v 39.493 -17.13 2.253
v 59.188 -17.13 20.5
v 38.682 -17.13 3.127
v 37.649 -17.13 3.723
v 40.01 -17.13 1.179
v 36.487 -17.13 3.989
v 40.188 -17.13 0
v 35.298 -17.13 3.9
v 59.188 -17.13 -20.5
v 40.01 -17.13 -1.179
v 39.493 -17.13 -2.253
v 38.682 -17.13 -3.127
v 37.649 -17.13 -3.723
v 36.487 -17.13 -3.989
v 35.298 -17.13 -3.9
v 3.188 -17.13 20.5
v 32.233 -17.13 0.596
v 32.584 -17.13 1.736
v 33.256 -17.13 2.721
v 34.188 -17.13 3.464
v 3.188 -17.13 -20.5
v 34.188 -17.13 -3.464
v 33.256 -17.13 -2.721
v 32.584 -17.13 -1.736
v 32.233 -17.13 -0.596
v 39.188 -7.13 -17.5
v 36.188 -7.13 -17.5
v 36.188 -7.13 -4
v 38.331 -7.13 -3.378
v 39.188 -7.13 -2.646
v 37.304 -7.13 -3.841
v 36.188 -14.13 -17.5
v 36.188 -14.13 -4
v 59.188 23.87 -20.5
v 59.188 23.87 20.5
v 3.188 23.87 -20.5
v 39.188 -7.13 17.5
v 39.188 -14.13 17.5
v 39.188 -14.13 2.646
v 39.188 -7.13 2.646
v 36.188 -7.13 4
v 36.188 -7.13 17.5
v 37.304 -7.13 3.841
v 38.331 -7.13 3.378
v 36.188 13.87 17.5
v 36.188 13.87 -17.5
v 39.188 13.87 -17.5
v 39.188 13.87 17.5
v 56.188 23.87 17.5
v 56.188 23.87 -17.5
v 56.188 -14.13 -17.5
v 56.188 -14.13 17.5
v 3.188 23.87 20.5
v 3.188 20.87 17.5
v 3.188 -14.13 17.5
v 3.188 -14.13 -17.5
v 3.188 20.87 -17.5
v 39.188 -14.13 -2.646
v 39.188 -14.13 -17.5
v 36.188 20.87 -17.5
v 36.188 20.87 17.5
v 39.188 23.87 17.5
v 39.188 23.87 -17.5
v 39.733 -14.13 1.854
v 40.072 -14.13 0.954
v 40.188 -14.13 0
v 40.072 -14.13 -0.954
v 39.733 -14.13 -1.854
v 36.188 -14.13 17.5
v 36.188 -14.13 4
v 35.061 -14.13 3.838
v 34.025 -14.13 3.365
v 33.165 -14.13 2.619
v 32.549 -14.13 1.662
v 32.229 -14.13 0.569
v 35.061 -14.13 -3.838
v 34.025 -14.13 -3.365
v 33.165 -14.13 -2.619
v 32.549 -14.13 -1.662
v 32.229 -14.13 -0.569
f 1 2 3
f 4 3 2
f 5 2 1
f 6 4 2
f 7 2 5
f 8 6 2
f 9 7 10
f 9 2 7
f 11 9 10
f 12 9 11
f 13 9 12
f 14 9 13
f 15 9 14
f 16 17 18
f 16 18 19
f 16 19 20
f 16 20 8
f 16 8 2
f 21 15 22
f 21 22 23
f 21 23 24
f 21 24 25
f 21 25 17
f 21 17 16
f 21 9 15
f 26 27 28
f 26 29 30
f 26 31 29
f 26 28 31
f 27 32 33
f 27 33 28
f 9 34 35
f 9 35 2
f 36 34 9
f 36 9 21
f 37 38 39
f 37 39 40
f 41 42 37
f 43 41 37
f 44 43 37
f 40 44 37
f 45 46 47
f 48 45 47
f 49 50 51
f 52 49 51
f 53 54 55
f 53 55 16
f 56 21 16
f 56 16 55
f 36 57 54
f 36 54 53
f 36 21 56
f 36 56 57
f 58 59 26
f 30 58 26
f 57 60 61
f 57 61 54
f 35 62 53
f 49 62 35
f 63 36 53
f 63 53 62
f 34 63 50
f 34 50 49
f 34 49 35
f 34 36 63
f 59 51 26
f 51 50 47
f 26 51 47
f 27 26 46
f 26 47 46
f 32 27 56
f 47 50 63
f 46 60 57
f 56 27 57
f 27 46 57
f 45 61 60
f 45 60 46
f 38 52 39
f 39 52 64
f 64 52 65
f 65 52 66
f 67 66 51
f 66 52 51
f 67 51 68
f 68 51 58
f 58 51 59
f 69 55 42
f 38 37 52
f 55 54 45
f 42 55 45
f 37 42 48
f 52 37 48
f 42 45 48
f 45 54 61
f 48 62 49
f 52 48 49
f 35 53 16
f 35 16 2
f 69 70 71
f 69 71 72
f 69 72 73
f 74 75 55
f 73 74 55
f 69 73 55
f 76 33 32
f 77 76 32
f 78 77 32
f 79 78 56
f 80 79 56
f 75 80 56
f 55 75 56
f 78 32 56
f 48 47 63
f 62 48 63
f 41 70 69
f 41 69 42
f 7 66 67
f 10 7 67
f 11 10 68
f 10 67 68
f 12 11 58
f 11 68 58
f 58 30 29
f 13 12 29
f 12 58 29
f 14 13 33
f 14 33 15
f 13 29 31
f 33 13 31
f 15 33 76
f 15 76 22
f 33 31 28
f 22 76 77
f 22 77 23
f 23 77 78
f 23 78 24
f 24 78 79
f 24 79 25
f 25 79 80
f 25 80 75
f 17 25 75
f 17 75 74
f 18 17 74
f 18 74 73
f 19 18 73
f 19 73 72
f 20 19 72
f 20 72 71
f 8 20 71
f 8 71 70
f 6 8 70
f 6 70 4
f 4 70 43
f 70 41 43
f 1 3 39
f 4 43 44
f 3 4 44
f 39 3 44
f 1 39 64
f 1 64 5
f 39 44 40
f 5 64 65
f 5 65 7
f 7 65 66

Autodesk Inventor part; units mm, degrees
ref_plane "YZ Plane" through (0, 0, 0) normal (1, 0, 0) x (0, 1, 0)
ref_plane "XZ Plane" through (0, 0, 0) normal (0, 1, 0) x (-1, 0, 0)
ref_plane "XY Plane" through (0, 0, 0) normal (0, 0, 1) x (1, 0, 0)
sketch "Sketch1" plane through (0, 0, 0) normal (0, 0, 1) x (1, 0, 0)
  line L0 (6.1879, 20.8703) -> (36.1879, 20.8703)
  line L1 (36.1879, -14.1297) -> (6.1879, -14.1297)
  line L2 (39.1879, 23.8703) -> (3.1879, 23.8703)
  line L3 (3.1879, -17.1297) -> (39.1879, -17.1297)
  line L4 (56.1879, 23.8703) -> (59.1879, 23.8703)
  line L5 (59.1879, 23.8703) -> (59.1879, -17.1297)
  line L6 (59.1879, -17.1297) -> (39.1879, -17.1297)
  line L7 (56.1879, 20.8703) -> (56.1879, -14.1297)
  line L8 (56.1879, -14.1297) -> (39.1879, -14.1297)
  line L9 (36.1879, 20.8703) -> (36.1879, 13.8703)
  line L10 (36.1879, 13.8703) -> (39.1879, 13.8703)
  line L11 (36.1879, -14.1297) -> (36.1879, -7.1297)
  line L12 (36.1879, -7.1297) -> (39.1879, -7.1297)
  line L13 (36.1879, 20.8703) -> (36.1879, 13.8703)
  line L14 (36.1879, -7.1297) -> (36.1879, -14.1297)
  line L15 (39.1879, -14.1297) -> (39.1879, -7.1297)
  line L16 (39.1879, 13.8703) -> (39.1879, 20.8703)
  line L17 (3.1879, 23.8703) -> (3.1879, 20.8703)
  line L18 (3.1879, -14.1297) -> (3.1879, -17.1297)
  line L19 (6.1879, 20.8703) -> (3.1879, 20.8703)
  line L20 (6.1879, -14.1297) -> (3.1879, -14.1297)
  line L21 (39.1879, 20.8703) -> (39.1879, 23.8703)
  line L22 (56.1879, 20.8703) -> (56.1879, 23.8703)
  point P0 (0, 0)
  dimension "d1" = 35
  dimension "d2" = 3
  dimension "d3" = 20
  dimension "d5" = 7
  dimension "d6" = 7
  dimension "d7" = 30
extrude "Extrusion1" add sketch "Sketch1" along normal mid plane 35
sketch "Sketch2" plane through (0, 0, -17.5) normal (0, 0, -1) x (-1, 0, 0)
  line L0 (-59.1879, 23.8703) -> (-3.1879, 23.8703) projected
  line L1 (-3.1879, -17.1297) -> (-59.1879, -17.1297) projected
  line L2 (-59.1879, 23.8703) -> (-3.1879, 23.8703)
  line L3 (-3.1879, 23.8703) -> (-3.1879, -17.1297)
  line L4 (-3.1879, -17.1297) -> (-59.1879, -17.1297)
  line L5 (-59.1879, -17.1297) -> (-59.1879, 23.8703)
  point P0 (0, 0)
extrude "Extrusion3" add sketch "Sketch2" along normal blind 3
sketch "Sketch3" plane through (0, 0, 17.5) normal (0, 0, 1) x (1, 0, 0)
  line L0 (3.1879, 23.8703) -> (59.1879, 23.8703) projected
  line L1 (59.1879, -17.1297) -> (3.1879, -17.1297) projected
  line L2 (3.1879, 23.8703) -> (59.1879, 23.8703)
  line L3 (59.1879, 23.8703) -> (59.1879, -17.1297)
  line L4 (59.1879, -17.1297) -> (3.1879, -17.1297)
  line L5 (3.1879, -17.1297) -> (3.1879, 23.8703)
  point P0 (0, 0)
extrude "Extrusion4" add sketch "Sketch3" along normal blind 3
sketch "Sketch4" plane through (3.1879, -14.1297, -17.5) normal (0, 1, 0) x (1, 0, 0)
  line L0 (56, 3) -> (0, 3) projected
  line L1 (0, 3) -> (56, 3)
  line L2 (0, -38) -> (56, -38) projected
  line L3 (56, 3) -> (56, -38)
  line L4 (33, 0) -> (33, -35) projected
  circle A0 centre (33, -17.5) radius 4
  point P0 (-3.1879, -17.5)
  dimension "d18" = 8
extrude "Extrusion5" cut sketch "Sketch4" along normal mid plane 15
